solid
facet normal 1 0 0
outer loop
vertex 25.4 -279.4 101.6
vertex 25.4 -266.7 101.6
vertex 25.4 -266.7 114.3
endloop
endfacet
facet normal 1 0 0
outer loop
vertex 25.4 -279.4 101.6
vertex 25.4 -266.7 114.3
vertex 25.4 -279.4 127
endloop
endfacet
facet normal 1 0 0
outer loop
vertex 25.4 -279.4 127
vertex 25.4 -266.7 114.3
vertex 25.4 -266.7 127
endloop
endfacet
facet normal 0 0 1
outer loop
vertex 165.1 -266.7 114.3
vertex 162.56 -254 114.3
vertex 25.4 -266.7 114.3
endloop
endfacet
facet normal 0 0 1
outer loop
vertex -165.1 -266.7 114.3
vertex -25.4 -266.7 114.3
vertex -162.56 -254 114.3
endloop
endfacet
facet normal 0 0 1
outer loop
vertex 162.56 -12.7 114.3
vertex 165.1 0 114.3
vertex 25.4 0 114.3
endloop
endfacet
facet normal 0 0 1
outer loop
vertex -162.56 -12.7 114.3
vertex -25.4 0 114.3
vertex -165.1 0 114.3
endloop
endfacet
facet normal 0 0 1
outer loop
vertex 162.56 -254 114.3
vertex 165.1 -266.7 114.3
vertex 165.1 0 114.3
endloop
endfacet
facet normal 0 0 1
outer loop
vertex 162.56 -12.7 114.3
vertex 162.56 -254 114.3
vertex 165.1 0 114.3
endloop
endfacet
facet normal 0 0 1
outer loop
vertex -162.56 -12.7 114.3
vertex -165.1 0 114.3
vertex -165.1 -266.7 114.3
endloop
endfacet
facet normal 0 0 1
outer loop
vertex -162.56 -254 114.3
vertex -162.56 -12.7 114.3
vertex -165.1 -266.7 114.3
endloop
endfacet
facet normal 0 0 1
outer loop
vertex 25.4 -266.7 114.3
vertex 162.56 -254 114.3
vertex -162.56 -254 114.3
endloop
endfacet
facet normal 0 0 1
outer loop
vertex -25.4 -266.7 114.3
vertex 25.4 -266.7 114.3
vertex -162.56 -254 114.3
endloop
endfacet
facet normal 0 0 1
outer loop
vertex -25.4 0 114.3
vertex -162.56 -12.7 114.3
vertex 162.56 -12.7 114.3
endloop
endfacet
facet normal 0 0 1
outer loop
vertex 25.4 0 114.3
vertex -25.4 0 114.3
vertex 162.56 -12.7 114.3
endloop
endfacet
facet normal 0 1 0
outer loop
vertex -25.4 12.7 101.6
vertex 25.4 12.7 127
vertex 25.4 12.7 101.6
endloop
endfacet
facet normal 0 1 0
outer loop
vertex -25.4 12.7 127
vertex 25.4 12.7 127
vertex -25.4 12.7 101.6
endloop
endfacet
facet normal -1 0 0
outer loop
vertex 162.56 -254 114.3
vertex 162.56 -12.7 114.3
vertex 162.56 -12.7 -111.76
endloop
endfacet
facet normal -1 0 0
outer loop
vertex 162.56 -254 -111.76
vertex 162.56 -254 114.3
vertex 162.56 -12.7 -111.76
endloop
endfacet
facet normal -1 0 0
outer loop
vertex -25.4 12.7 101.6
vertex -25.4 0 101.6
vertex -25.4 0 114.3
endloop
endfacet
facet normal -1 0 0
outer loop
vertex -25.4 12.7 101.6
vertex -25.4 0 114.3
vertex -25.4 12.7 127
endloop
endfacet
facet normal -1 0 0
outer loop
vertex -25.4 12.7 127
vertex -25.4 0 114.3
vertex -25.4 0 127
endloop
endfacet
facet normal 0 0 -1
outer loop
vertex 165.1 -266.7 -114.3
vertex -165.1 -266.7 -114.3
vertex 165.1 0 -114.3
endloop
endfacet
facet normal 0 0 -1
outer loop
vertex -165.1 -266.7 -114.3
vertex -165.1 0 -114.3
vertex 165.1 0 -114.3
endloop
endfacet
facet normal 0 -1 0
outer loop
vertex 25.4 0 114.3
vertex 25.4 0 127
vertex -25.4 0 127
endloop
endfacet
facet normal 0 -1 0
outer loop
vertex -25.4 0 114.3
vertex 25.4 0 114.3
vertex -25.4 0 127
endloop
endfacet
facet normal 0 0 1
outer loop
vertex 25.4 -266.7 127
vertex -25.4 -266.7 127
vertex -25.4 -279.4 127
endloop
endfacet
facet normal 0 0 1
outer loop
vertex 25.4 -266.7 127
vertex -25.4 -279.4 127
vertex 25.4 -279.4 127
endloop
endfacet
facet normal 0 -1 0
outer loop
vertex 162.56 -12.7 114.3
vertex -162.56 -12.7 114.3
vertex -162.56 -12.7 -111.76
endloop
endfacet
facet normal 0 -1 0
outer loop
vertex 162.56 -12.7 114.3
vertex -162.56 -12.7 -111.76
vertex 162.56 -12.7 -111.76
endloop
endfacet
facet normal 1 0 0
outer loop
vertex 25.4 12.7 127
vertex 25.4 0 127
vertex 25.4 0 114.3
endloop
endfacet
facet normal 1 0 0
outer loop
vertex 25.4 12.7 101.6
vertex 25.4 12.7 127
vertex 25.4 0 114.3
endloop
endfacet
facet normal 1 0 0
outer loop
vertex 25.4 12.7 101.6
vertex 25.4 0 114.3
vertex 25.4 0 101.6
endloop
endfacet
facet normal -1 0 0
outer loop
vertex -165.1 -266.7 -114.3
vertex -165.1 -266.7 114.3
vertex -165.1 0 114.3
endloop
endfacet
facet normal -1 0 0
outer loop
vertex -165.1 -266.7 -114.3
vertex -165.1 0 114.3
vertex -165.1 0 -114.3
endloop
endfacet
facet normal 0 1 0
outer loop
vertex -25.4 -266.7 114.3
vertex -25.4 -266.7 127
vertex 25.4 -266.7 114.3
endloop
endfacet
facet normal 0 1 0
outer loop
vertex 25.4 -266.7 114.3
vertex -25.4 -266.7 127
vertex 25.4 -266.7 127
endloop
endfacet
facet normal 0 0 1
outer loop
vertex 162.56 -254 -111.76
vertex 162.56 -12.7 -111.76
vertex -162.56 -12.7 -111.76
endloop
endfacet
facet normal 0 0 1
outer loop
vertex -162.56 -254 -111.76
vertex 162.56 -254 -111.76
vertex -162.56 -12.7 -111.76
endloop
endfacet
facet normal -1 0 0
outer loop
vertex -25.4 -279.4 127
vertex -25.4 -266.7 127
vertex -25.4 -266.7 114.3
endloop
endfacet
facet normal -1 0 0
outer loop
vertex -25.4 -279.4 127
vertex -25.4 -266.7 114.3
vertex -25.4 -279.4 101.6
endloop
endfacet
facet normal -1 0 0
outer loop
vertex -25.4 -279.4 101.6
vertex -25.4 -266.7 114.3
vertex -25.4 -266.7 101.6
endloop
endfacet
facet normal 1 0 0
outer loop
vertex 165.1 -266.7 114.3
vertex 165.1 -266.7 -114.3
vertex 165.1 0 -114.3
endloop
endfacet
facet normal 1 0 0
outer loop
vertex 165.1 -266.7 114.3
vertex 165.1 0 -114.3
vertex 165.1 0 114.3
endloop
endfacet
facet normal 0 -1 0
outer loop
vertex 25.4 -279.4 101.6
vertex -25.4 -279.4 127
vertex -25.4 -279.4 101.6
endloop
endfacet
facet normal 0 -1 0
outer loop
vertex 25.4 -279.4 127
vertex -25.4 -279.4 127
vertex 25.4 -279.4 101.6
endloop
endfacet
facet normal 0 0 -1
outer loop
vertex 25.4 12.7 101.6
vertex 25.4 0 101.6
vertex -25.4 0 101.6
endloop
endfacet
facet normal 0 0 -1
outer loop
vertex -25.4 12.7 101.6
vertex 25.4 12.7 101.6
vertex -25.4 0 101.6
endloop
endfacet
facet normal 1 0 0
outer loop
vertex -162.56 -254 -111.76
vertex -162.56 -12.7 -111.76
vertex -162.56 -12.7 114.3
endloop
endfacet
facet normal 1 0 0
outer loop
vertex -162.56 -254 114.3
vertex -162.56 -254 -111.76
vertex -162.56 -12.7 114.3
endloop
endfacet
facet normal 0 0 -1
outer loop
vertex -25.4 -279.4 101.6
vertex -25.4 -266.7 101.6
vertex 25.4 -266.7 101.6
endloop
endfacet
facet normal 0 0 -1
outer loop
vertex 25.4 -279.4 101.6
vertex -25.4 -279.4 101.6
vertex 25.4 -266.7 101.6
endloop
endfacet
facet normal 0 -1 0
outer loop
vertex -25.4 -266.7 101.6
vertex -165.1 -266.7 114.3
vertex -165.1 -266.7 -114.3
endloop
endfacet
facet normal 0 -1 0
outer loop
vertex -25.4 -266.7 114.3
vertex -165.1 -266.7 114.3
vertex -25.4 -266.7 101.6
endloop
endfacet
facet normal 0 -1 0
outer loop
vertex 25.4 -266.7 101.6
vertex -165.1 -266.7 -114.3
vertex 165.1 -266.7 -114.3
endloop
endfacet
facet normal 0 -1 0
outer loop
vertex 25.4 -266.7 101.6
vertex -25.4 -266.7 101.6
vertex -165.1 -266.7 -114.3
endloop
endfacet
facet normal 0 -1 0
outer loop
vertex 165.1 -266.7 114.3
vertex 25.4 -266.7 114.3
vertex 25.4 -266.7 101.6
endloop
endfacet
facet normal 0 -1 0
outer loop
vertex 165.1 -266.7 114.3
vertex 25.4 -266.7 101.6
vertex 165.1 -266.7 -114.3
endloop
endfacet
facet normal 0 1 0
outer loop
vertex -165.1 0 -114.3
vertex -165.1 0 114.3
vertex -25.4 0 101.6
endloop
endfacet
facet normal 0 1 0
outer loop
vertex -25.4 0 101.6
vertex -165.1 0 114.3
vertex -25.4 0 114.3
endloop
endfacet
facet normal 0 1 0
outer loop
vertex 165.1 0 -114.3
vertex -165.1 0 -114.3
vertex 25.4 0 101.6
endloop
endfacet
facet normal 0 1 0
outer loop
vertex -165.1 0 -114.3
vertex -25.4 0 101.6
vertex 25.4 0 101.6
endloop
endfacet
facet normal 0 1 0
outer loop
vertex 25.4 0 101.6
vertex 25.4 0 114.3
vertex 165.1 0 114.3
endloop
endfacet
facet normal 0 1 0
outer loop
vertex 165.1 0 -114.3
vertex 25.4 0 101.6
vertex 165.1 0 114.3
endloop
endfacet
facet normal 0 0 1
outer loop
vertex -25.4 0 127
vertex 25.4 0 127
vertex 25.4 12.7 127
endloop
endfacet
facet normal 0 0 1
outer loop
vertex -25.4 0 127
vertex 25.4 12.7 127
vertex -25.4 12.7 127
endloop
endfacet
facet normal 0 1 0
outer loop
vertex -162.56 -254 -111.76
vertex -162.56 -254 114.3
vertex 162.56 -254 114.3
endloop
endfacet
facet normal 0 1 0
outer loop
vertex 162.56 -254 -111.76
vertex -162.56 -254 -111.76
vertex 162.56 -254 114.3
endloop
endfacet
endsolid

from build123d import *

# Parameters (mm, degrees)
F0_W     = 330.2
F0_H     = 228.6
F1_DEPTH = 12.7
F3_DEPTH = 241.3
F5_DEPTH = 12.7
F6_W     = 50.8
F6_H     = 12.7
F7_DEPTH = 12.7
F8_W     = 50.8
F8_H     = 12.7
F9_DEPTH = 12.7


with BuildPart() as f1:
    # F0 (on Front) → F1 (new body)
    with BuildSketch(Plane.XZ):
        Rectangle(F0_W, F0_H)
    extrude(amount=F1_DEPTH)

    # F2 (on face) → F3 (join)
    with BuildSketch(Plane.XZ.offset(12.7)):
        Polygon((-162.56, -111.76), (-162.56, 114.3), (-165.1, 114.3), (-165.1, -114.3), (165.1, -114.3), (165.1, 114.3), (162.56, 114.3), (162.56, -111.76), align=None)
    extrude(amount=F3_DEPTH)

    # F4 (on face) → F5 (join)
    with BuildSketch(Plane.XZ.offset(254)):
        Polygon((-162.56, 114.3), (-165.1, 114.3), (-165.1, -114.3), (165.1, -114.3), (165.1, 114.3), align=None)
    extrude(amount=F5_DEPTH)

    # F6 (on face) → F7 (join)
    with BuildSketch(Plane.XZ.offset(266.7)):
        with Locations((0, 120.65)):
            Rectangle(F6_W, F6_H)
        with Locations((0, 107.95)):
            Rectangle(F6_W, F6_H)
    extrude(amount=F7_DEPTH)

    # F8 (on face) → F9 (join)
    with BuildSketch(Plane(origin=(0, 0, 0), x_dir=(-1, 0, 0), z_dir=(0, 1, 0))):
        with Locations((0, 107.95)):
            Rectangle(F8_W, F8_H)
        with Locations((0, 120.65)):
            Rectangle(F8_W, F8_H)
    extrude(amount=F9_DEPTH)


solid = f1.part
